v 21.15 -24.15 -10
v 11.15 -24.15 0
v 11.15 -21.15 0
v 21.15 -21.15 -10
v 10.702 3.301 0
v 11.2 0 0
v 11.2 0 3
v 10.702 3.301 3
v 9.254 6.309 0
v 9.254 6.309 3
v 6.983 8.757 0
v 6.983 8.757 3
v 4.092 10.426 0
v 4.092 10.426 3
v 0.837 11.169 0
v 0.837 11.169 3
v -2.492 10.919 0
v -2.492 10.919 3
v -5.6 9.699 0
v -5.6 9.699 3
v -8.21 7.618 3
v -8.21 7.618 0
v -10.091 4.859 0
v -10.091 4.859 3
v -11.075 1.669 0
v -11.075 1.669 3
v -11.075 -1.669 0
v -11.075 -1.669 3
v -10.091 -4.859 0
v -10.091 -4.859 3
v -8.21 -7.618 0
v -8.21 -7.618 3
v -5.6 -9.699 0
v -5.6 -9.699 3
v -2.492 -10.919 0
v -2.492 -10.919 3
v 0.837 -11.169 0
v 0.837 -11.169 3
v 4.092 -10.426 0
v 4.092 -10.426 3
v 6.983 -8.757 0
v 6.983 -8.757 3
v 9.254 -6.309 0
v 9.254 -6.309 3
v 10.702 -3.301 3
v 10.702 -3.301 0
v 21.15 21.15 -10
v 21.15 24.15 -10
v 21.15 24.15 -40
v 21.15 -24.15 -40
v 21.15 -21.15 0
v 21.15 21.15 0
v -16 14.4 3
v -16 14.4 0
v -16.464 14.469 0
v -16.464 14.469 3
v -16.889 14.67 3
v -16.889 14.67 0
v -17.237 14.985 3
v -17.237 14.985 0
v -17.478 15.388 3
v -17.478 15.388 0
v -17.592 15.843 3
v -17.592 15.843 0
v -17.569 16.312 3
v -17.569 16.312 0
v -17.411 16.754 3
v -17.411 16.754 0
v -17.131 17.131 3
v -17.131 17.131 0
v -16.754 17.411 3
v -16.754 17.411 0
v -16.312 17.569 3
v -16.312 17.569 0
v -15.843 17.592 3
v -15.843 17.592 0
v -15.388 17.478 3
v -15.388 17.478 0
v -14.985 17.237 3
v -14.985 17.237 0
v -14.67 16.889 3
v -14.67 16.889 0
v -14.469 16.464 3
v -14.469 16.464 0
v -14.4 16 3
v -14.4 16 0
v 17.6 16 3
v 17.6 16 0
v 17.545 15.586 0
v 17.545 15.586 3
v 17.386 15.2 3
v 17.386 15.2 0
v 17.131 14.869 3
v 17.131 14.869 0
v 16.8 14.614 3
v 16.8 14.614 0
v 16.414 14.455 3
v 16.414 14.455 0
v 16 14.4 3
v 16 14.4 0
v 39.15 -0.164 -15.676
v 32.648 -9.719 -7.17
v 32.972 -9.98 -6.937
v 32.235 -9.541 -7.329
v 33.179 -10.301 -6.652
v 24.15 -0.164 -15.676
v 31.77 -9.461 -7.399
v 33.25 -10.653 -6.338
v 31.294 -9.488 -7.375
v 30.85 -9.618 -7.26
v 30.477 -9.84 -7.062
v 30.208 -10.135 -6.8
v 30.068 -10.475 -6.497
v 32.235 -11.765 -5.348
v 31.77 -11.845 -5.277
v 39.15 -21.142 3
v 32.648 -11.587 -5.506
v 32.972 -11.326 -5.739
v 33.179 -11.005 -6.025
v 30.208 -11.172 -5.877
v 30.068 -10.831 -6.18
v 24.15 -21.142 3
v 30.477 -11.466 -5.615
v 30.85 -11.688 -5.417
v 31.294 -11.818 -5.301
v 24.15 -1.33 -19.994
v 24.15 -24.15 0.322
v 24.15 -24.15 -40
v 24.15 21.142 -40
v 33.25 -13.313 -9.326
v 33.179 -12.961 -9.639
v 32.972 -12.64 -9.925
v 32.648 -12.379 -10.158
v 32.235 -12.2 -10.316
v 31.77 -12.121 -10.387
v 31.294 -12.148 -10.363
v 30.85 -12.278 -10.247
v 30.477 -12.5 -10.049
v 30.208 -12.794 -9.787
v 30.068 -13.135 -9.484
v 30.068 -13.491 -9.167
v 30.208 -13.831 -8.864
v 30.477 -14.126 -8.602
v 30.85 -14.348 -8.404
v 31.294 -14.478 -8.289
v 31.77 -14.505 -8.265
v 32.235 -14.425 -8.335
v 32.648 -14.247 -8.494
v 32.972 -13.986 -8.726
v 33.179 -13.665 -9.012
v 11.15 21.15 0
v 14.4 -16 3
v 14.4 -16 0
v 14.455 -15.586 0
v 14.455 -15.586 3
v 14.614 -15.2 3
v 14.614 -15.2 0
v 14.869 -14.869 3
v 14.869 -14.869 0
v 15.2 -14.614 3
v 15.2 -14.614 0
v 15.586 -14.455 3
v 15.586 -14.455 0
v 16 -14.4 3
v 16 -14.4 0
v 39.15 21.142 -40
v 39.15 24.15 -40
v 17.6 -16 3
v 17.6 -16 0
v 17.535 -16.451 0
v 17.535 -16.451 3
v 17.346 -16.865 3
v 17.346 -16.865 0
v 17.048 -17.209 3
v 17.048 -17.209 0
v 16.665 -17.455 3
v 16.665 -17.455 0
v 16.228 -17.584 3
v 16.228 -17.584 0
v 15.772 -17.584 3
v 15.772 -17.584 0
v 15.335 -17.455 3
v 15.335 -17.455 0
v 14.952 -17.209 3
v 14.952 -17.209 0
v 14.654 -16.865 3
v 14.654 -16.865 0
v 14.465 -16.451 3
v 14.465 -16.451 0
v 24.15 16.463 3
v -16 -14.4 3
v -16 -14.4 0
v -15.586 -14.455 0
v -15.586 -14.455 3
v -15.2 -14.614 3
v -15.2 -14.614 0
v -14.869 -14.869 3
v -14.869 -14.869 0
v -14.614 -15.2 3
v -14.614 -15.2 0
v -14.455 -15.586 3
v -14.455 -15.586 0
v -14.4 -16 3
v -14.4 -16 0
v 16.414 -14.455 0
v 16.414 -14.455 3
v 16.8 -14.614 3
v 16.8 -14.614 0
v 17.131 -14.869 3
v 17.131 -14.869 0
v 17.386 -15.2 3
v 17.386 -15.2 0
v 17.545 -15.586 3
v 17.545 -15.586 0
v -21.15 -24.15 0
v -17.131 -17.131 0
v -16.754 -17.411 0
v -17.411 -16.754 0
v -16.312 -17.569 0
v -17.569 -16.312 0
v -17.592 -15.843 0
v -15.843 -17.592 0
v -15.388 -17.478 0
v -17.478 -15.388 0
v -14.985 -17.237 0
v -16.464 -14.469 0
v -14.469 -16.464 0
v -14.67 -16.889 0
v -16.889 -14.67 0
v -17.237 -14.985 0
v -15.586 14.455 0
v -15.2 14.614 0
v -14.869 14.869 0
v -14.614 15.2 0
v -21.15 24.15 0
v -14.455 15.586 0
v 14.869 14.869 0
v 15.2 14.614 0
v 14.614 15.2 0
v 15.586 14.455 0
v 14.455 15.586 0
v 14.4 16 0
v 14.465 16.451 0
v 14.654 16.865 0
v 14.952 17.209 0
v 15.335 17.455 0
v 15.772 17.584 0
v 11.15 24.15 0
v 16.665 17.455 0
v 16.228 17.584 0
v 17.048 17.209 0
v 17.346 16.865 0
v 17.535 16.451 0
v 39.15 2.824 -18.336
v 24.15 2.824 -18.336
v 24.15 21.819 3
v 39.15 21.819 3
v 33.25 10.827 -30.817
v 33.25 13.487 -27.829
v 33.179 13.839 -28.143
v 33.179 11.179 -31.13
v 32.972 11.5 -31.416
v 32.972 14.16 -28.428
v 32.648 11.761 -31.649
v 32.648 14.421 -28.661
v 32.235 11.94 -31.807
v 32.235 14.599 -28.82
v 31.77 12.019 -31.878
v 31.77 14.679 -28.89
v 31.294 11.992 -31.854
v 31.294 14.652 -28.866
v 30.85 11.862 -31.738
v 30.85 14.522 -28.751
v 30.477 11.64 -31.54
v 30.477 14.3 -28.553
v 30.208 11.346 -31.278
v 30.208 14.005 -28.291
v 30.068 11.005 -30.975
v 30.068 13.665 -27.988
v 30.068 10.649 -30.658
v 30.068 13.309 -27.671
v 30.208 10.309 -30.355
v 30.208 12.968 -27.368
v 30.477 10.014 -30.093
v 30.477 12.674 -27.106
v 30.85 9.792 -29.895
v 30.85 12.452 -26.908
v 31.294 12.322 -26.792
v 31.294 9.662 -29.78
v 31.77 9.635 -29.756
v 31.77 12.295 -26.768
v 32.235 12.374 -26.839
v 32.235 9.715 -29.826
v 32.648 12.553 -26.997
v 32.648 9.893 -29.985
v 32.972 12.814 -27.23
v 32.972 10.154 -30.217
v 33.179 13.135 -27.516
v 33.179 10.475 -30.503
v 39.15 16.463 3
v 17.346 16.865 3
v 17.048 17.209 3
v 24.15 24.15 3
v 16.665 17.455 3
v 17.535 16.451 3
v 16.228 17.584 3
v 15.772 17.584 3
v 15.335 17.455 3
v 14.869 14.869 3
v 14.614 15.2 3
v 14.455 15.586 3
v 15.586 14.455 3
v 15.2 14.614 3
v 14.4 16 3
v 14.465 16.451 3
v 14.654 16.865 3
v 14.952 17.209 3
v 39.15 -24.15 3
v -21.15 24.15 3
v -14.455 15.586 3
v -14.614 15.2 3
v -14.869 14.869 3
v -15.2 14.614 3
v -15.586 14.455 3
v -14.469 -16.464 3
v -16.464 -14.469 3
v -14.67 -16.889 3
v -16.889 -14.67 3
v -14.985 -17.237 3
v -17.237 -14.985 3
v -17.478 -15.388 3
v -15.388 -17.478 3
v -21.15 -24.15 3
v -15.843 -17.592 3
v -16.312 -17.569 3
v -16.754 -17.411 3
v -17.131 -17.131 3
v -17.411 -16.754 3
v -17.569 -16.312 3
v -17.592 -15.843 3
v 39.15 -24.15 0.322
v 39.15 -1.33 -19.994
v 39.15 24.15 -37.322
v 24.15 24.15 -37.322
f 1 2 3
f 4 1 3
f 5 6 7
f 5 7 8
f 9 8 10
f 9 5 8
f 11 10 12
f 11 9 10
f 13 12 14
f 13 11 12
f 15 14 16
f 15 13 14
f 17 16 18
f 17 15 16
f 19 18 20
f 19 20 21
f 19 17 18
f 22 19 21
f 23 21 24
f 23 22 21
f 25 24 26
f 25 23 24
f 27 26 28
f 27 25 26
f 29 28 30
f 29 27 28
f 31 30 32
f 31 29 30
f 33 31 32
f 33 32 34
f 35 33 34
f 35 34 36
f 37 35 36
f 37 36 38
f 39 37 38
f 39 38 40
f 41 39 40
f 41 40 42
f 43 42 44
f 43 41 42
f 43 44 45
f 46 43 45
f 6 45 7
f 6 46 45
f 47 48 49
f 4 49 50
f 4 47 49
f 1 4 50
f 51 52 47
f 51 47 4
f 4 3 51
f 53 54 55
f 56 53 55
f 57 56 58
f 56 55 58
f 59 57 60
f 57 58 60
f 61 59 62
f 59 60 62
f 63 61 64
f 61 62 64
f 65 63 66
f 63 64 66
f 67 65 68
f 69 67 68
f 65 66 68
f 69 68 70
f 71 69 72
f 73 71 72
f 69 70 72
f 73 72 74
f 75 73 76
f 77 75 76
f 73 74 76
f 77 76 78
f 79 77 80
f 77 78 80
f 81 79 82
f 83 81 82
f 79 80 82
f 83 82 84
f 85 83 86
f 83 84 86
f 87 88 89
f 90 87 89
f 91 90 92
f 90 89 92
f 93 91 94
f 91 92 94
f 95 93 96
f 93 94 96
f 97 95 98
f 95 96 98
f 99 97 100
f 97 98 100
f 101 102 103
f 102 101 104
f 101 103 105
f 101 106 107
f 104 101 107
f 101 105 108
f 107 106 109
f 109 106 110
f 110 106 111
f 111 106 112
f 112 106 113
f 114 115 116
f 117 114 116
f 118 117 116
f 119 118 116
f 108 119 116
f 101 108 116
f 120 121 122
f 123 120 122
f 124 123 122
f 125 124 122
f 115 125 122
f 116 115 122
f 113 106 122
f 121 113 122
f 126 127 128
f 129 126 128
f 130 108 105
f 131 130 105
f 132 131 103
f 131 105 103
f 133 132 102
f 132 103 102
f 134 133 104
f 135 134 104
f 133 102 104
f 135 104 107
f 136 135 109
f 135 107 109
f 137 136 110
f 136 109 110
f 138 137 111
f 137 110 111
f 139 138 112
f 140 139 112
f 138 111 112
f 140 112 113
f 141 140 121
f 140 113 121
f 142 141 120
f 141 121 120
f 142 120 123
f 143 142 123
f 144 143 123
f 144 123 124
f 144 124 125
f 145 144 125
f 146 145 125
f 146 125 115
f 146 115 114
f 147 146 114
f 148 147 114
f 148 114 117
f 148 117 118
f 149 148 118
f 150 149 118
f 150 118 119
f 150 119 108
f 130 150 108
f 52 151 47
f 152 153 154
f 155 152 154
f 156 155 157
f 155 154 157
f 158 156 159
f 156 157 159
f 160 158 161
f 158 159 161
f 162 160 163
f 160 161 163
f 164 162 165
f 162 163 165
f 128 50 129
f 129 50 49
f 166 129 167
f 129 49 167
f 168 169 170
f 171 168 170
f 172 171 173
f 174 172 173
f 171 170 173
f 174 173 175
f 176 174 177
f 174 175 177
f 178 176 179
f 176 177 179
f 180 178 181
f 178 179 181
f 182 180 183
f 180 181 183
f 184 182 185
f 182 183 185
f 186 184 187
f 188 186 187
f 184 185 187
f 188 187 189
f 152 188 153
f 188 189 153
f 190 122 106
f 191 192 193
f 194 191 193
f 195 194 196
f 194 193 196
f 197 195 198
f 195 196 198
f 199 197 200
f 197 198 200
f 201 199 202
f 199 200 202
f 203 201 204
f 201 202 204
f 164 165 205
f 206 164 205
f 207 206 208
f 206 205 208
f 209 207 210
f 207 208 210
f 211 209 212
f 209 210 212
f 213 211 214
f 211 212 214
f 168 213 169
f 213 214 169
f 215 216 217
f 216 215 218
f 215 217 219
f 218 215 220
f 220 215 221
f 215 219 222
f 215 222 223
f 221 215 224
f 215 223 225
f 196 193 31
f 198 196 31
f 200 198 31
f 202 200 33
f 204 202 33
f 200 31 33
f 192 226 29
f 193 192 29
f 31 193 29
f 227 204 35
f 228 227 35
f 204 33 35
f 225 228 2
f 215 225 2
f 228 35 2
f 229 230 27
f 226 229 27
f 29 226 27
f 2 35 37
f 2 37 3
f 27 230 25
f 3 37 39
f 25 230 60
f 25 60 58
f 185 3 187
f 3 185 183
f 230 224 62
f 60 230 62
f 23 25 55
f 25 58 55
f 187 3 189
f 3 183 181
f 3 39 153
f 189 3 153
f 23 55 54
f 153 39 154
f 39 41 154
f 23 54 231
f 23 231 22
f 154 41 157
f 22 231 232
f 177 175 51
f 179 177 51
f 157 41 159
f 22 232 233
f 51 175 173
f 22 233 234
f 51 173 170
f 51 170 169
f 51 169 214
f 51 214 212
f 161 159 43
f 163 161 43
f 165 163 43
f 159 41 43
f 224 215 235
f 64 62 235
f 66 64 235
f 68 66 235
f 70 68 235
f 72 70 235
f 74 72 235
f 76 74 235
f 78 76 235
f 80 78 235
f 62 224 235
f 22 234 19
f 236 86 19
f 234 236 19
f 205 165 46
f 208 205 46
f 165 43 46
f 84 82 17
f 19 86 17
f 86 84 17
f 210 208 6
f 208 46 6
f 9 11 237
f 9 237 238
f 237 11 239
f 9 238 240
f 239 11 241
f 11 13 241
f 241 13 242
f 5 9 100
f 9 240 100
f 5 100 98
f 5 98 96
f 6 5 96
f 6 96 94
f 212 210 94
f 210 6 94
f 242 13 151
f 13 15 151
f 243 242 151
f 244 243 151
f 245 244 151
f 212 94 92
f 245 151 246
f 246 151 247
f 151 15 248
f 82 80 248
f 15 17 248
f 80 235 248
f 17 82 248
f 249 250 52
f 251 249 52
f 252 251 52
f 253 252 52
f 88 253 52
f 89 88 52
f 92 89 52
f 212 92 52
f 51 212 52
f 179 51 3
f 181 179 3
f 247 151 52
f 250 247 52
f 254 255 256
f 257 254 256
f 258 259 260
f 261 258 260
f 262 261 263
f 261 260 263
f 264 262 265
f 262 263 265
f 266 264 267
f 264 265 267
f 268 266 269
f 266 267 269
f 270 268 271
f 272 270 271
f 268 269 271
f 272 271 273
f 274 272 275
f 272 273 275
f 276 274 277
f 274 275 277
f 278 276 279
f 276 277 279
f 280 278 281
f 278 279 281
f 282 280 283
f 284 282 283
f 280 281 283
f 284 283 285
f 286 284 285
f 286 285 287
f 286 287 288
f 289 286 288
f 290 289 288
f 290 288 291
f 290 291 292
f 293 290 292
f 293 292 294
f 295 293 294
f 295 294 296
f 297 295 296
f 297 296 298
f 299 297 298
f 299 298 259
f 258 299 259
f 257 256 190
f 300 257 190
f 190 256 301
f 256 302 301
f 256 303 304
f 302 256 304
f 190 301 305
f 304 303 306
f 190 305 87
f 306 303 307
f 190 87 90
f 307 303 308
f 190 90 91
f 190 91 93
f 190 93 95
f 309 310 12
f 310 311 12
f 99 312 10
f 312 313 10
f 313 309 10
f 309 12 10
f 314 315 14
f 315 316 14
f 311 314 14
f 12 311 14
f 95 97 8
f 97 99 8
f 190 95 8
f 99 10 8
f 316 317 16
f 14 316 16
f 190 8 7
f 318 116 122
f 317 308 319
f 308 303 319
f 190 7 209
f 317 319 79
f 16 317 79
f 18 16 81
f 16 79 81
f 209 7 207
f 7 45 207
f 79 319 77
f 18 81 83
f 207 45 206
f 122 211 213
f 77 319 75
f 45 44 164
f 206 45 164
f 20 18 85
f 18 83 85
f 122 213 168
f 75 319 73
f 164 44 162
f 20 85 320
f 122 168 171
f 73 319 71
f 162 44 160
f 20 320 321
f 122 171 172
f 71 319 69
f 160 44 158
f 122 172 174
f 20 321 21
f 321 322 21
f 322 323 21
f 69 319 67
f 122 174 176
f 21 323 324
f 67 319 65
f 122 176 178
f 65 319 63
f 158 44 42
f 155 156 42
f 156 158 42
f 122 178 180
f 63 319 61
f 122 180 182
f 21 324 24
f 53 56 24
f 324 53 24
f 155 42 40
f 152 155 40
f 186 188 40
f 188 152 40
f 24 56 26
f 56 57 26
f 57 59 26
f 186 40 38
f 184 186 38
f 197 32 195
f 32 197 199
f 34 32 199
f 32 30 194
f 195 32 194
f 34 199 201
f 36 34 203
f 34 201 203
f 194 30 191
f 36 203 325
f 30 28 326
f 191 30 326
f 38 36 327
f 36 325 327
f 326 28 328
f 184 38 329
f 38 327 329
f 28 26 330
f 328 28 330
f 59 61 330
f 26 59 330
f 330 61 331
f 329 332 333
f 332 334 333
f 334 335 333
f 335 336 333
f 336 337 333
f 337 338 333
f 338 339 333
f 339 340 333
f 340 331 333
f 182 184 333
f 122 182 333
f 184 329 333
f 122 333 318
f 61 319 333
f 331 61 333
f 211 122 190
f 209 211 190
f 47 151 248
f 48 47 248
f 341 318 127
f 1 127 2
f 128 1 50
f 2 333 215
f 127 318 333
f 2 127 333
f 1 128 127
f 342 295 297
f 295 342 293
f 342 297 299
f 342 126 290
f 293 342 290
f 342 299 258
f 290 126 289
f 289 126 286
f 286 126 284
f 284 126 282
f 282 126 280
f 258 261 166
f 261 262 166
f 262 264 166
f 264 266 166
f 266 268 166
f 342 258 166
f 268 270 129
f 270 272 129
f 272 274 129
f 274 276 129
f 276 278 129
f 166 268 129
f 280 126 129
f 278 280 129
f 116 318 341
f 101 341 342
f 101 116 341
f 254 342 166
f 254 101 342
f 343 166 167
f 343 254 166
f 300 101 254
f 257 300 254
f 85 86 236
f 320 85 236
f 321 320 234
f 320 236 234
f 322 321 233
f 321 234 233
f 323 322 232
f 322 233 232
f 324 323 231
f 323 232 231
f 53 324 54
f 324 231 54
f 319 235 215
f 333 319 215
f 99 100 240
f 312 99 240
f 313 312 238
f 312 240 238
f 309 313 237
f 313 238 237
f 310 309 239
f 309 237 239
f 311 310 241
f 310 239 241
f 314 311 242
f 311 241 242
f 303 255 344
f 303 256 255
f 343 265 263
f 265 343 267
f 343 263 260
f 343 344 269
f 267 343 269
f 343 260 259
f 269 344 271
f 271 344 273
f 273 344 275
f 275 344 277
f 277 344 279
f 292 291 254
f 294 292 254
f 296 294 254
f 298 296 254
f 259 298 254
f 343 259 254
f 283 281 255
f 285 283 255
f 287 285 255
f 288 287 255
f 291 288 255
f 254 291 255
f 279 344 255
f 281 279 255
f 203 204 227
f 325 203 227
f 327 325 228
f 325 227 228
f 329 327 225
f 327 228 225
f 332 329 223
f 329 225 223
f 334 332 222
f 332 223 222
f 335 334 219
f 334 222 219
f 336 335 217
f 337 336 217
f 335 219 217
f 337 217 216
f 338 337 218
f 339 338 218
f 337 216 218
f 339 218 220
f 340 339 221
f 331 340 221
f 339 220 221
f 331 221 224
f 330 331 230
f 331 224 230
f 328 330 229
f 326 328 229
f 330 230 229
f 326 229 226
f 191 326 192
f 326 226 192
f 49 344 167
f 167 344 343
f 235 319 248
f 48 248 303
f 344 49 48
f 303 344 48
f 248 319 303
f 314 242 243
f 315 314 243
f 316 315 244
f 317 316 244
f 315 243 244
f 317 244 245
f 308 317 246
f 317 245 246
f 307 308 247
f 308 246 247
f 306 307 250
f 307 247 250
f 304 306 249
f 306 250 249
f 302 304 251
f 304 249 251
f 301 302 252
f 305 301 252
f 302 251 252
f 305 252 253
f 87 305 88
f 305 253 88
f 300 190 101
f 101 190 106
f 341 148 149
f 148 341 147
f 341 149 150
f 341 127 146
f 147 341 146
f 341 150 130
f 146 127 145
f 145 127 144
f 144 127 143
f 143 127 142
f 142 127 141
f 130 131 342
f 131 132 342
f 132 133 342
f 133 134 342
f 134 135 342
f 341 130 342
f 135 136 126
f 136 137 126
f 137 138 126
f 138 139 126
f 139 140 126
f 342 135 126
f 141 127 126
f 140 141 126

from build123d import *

# Parameters (mm, degrees)
F0_W     = 10
F0_H     = 3
F0_W_2   = 32.3
F0_R     = 11.2
F1_DEPTH = 3
F2_DEPTH = 40
F4_DEPTH = 15
F5_DEPTH = 10
F6_SIZE  = 9.99999
F7_R     = 1.6
F8_R     = 1.6
F9_DEPTH = 25


# Not quite as in the source:
# - a fillet or chamfer is up to 0.001 mm smaller than in the source, because OpenCascade refuses the exact size


with BuildPart() as f1:
    # F0 (on Top) → F1 (new body)
    with BuildSketch(Plane.XY):
        Polygon((21.15, -21.15), (21.15, 21.15), (11.15, 21.15), (-21.15, 21.15), (-21.15, -21.15), (11.15, -21.15), align=None)
        with BuildLine():
            ThreePointArc((-16, 14.4), (-17.1313708499, 17.1313708499), (-14.4, 16))
            Line((-14.4, 16), (14.4, 16))
            ThreePointArc((14.4, 16), (16, 17.6), (17.6, 16))
            ThreePointArc((17.6, 16), (17.1313708499, 14.8686291501), (16, 14.4))
            Line((16, 14.4), (16, -14.4))
            ThreePointArc((16, -14.4), (17.1313708499, -14.8686291501), (17.6, -16))
            ThreePointArc((17.6, -16), (16, -17.6), (14.4, -16))
            Line((14.4, -16), (-14.4, -16))
            ThreePointArc((-14.4, -16), (-17.1313708499, -17.1313708499), (-16, -14.4))
            Line((-16, -14.4), (-16, 14.4))
        make_face(mode=Mode.SUBTRACT)
        Polygon((21.15, 24.15), (21.15, 21.15), (21.15, -21.15), (21.15, -24.15), (24.15, -24.15), (24.15, 24.15), align=None)
        with Locations((16.15, 22.65)):
            Rectangle(F0_W, F0_H)
        with Locations((-5, 22.65)):
            Rectangle(F0_W_2, F0_H)
        with Locations((16.15, -22.65)):
            Rectangle(F0_W, F0_H)
        Polygon((11.15, -24.15), (11.15, -21.15), (-21.15, -21.15), (-21.15, -24.15), (9.2402426526, -24.15), align=None)
        with BuildLine():
            Line((14.4, 16), (-14.4, 16))
            ThreePointArc((-14.4, 16), (-14.8686291501, 14.8686291501), (-16, 14.4))
            Line((-16, 14.4), (-16, -14.4))
            ThreePointArc((-16, -14.4), (-14.8686291501, -14.8686291501), (-14.4, -16))
            Line((-14.4, -16), (14.4, -16))
            ThreePointArc((14.4, -16), (14.8686291501, -14.8686291501), (16, -14.4))
            Line((16, -14.4), (16, 14.4))
            ThreePointArc((16, 14.4), (14.8686291501, 14.8686291501), (14.4, 16))
        make_face()
        Circle(F0_R, mode=Mode.SUBTRACT)
    extrude(amount=F1_DEPTH)

    # F0 (on Top) → F2 (join)
    with BuildSketch(Plane.XY):
        Polygon((21.15, 24.15), (21.15, 21.15), (21.15, -21.15), (21.15, -24.15), (24.15, -24.15), (24.15, 24.15), align=None)
    extrude(amount=-F2_DEPTH)

    # F3 (on face) → F4 (join)
    with BuildSketch(Plane.YZ.offset(24.15)):
        Polygon((-0.1639153264, -15.6763265476), (1.329879063, -17.0062056106), (19.1407867495, 3), (16.4630420556, 3), align=None)
        Polygon((19.1407867495, 3), (1.329879063, -17.0062056106), (2.8236734524, -18.3360846736), (21.8185314434, 3), align=None)
        Polygon((1.329879063, -17.0062056106), (0, -18.5), (24.15, -40), (24.15, -37.3222553061), (2.8236734524, -18.3360846736), align=None)
        Polygon((24.15, -40), (0, -18.5), (-1.329879063, -19.9937943894), (21.1422077043, -40), align=None)
        Polygon((0, -18.5), (-24.15, 3), (-24.15, 0.3222553061), (-1.329879063, -19.9937943894), align=None)
        Polygon((-21.1422077043, 3), (-24.15, 3), (0, -18.5), (1.329879063, -17.0062056106), (-0.1639153264, -15.6763265476), align=None)
    extrude(amount=F4_DEPTH)

    # F0 (on Top) → F5 (join)
    with BuildSketch(Plane.XY):
        with Locations((16.15, 22.65)):
            Rectangle(F0_W, F0_H)
        with Locations((16.15, -22.65)):
            Rectangle(F0_W, F0_H)
    extrude(amount=-F5_DEPTH)

    # F6 (size 10 in the source; OpenCascade refuses exactly that, so slightly less here)
    f6_edges = [f1.edges().sort_by_distance(p)[0] for p in [
        (11.15, 22.65, -10),
        (11.15, -22.65, -10),
    ]]
    chamfer(f6_edges, length=F6_SIZE)

    # F7 (on face) + F8 (on face) → F9 (cut)
    with BuildSketch(Plane(origin=(0, -7.8579881454, -8.8265308702), x_dir=(1, 0, 0), z_dir=(0, 0.6649395315, 0.7468971947))):
        with Locations((31.65, 28.5779957713)):
            Circle(F7_R)
    with BuildSketch(Plane(origin=(0, -7.8579881454, -8.8265308702), x_dir=(1, 0, 0), z_dir=(0, 0.6649395315, 0.7468971947))):
        with Locations((31.65, -3.7422464428)):
            Circle(F8_R)
    extrude(amount=-F9_DEPTH, mode=Mode.SUBTRACT)


solid = f1.part
